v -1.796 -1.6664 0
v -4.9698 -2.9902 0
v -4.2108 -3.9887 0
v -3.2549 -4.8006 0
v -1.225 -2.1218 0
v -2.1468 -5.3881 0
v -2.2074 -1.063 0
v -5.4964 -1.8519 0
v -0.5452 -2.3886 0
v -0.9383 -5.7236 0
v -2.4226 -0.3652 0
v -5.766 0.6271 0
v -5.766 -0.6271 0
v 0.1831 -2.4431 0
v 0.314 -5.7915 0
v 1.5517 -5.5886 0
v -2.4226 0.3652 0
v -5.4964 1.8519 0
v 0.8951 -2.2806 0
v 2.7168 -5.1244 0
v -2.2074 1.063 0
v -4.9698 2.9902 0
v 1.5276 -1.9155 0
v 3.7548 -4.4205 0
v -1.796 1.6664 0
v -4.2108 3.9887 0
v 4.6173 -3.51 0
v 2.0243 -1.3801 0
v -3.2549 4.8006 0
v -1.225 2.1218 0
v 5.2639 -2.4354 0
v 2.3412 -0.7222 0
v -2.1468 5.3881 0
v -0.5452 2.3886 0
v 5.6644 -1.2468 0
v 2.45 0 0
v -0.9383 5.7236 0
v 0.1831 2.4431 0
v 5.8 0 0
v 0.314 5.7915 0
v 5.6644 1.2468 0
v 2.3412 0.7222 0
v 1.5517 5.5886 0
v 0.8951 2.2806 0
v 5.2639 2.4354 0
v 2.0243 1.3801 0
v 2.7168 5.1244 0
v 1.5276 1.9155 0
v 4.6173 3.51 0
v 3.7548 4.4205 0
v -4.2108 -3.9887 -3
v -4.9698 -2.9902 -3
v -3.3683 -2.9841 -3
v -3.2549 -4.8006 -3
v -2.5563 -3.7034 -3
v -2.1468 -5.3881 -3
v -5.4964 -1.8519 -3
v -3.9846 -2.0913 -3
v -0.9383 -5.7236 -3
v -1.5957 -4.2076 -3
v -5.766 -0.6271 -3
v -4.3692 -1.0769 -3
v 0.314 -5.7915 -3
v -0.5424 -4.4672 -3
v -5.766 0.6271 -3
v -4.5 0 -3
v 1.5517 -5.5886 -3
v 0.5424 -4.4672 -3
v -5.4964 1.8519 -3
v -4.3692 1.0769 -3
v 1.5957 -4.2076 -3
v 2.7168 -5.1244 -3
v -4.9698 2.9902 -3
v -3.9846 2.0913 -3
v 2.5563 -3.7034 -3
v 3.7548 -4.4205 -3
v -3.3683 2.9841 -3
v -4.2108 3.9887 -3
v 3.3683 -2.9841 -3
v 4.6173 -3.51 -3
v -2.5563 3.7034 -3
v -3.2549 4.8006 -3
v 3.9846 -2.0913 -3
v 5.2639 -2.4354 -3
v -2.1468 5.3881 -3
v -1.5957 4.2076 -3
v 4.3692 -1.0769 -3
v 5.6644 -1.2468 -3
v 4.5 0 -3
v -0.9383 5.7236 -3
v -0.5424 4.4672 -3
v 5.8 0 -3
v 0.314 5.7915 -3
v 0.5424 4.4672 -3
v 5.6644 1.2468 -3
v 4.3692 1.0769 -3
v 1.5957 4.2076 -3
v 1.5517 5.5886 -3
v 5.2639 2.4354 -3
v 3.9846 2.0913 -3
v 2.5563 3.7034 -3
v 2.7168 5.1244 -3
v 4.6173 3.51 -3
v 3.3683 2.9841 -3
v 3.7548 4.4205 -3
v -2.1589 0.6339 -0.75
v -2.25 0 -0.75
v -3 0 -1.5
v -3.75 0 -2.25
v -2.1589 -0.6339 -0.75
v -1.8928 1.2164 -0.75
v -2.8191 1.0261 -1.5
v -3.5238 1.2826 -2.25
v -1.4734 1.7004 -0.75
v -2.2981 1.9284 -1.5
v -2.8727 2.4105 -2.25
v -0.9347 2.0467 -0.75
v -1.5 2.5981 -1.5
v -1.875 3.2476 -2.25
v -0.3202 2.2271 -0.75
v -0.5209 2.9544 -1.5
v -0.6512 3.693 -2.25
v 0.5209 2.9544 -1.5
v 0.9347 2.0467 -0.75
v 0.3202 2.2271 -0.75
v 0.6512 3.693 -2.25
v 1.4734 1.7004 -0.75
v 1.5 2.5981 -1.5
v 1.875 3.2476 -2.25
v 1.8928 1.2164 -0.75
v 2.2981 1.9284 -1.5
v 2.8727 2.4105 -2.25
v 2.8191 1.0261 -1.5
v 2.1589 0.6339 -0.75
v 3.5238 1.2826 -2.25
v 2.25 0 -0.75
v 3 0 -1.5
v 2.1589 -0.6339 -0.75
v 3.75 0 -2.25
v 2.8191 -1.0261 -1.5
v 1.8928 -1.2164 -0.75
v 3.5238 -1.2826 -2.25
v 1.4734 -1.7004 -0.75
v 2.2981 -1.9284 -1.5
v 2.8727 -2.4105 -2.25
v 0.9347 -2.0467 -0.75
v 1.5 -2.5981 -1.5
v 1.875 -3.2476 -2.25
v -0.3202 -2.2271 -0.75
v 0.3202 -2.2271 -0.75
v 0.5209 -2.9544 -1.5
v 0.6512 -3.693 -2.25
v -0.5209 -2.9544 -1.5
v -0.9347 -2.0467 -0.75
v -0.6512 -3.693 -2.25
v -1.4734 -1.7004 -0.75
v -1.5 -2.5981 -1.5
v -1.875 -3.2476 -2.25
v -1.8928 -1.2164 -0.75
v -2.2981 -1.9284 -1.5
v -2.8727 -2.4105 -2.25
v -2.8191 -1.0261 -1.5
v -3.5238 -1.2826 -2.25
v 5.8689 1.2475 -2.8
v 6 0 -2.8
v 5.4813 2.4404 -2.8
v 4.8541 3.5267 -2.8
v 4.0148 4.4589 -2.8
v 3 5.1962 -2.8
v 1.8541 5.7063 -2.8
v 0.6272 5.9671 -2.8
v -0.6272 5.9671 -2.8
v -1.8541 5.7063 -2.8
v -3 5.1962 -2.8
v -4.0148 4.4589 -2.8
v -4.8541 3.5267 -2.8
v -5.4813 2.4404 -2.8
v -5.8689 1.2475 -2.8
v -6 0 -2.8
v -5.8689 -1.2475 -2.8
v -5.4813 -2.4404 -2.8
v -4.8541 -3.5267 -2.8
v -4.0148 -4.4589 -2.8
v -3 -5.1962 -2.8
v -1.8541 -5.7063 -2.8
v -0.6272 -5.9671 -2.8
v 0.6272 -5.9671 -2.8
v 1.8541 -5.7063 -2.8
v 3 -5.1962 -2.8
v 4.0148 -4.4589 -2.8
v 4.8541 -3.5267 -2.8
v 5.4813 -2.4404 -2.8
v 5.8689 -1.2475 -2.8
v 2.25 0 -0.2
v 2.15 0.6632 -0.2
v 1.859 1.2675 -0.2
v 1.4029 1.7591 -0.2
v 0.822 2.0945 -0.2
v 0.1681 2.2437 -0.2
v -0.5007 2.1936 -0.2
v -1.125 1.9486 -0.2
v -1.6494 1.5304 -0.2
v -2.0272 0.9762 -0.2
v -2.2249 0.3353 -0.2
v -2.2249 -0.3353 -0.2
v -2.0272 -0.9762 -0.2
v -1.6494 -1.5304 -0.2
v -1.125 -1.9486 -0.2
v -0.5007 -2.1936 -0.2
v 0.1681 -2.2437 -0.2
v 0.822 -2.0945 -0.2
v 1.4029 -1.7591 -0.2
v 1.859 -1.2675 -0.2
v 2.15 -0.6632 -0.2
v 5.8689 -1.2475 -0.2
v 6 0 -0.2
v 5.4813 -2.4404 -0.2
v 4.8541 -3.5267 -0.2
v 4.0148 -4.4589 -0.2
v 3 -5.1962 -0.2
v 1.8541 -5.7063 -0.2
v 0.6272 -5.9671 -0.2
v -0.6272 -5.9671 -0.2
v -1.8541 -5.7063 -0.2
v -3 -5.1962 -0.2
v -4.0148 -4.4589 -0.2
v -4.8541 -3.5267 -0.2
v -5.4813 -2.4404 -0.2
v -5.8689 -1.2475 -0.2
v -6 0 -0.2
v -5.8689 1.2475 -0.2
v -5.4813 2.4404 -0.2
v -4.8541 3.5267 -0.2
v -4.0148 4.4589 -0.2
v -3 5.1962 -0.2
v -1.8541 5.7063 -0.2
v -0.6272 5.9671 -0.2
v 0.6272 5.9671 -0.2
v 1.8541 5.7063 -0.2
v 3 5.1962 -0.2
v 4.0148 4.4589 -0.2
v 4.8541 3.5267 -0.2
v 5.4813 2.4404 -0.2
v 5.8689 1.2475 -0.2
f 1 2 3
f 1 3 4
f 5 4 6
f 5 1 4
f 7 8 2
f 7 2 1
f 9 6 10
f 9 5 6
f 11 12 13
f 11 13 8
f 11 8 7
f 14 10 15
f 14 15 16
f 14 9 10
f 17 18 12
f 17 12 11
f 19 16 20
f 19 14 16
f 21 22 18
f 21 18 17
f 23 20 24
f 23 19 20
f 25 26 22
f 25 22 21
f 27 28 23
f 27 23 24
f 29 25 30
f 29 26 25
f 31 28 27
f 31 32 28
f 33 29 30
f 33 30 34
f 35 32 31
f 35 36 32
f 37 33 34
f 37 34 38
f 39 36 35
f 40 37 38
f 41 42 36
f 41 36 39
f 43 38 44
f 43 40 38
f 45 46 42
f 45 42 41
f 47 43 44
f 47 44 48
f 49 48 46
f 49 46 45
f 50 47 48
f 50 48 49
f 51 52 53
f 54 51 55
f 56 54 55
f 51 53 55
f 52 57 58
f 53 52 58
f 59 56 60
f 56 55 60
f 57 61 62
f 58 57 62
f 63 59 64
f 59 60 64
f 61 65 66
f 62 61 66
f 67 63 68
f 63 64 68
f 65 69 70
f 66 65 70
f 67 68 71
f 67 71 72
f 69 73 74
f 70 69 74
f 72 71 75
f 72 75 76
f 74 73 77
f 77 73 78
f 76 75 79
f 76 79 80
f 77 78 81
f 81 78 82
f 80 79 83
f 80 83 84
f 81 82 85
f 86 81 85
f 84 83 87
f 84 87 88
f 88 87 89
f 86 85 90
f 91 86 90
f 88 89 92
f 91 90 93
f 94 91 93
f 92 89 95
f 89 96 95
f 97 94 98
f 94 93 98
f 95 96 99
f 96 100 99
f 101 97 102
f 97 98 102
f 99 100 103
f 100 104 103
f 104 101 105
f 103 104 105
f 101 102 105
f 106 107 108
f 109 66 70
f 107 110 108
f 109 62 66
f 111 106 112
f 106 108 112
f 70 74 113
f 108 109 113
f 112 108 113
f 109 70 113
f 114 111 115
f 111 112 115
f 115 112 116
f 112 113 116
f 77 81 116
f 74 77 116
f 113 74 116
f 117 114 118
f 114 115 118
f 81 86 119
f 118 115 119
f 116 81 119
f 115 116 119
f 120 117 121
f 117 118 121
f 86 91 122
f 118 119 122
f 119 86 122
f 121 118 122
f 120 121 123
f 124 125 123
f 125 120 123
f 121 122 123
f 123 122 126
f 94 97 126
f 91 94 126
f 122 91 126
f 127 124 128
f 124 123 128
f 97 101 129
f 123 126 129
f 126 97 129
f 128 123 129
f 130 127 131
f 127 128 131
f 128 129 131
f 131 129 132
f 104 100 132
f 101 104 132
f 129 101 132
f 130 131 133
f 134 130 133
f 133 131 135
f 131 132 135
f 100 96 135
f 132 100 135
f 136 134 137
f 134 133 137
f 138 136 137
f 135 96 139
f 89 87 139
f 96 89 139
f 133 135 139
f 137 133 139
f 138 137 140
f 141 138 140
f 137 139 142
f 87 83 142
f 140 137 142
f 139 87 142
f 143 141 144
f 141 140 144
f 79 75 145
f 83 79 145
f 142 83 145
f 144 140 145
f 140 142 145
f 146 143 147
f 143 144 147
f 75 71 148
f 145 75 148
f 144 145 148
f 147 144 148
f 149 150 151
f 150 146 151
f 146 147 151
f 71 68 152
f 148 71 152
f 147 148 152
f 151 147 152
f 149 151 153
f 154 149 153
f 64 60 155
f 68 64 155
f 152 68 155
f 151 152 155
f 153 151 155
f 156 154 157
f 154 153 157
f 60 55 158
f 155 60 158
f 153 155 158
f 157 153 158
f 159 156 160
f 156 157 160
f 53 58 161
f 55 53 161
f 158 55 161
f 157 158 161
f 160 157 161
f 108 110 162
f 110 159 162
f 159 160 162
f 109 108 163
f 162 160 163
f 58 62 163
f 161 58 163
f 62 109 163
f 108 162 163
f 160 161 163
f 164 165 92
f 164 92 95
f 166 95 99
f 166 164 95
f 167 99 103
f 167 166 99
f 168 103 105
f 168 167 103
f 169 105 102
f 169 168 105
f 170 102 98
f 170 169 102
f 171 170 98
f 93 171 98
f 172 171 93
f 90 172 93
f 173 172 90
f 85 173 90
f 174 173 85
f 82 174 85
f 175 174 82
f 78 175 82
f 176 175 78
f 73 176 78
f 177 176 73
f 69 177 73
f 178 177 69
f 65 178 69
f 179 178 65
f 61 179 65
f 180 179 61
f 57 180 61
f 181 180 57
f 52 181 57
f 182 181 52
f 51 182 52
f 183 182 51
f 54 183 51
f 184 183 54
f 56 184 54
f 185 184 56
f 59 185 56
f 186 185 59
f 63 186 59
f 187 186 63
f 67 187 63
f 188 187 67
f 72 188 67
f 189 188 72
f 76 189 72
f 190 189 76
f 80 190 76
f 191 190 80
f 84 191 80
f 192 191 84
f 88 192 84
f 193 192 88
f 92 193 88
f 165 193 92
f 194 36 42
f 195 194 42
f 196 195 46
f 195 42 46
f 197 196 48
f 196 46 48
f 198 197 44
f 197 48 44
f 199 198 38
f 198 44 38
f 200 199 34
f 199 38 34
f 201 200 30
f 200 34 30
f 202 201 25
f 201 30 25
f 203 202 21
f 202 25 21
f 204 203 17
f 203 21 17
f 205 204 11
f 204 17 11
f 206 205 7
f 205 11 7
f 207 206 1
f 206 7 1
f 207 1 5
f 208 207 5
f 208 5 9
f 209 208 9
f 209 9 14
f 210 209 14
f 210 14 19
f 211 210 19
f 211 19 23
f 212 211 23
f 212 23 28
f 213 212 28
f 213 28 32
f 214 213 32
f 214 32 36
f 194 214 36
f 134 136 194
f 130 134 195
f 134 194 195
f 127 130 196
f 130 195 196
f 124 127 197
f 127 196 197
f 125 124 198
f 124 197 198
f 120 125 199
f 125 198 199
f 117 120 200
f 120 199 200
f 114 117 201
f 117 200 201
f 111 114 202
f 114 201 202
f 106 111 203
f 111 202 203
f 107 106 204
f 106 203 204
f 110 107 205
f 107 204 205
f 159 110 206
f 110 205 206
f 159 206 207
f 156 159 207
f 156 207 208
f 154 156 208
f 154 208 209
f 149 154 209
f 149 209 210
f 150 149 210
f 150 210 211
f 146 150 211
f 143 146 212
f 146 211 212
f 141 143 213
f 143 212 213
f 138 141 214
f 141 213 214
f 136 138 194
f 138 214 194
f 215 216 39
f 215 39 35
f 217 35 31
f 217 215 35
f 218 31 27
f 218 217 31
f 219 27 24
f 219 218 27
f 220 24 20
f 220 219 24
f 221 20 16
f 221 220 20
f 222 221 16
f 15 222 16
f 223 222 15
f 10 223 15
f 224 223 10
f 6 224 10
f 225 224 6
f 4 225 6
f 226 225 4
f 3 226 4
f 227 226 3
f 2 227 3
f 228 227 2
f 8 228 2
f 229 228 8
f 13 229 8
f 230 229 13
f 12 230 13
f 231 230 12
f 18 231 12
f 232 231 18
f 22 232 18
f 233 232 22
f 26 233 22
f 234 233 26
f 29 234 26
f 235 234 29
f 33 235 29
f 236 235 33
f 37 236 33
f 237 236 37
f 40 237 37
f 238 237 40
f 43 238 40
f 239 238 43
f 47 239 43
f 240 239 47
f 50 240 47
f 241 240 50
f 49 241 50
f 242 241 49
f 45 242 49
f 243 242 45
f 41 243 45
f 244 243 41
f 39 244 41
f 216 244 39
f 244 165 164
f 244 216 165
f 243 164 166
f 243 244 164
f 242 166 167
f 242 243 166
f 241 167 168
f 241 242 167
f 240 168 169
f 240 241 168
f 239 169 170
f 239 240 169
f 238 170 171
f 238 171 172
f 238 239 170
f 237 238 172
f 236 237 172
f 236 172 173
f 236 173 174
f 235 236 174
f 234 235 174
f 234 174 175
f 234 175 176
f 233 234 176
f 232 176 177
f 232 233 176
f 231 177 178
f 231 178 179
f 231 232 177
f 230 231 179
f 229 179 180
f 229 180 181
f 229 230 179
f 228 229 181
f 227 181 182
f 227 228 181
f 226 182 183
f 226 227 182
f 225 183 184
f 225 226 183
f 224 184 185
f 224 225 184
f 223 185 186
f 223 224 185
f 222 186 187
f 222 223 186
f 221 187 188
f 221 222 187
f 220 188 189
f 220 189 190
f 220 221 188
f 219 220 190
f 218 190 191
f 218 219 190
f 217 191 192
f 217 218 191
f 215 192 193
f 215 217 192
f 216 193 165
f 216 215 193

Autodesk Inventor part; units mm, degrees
ref_plane "YZ Plane" through (0, 0, 0) normal (1, 0, 0) x (0, 1, 0)
ref_plane "XZ Plane" through (0, 0, 0) normal (0, 1, 0) x (-1, 0, 0)
ref_plane "XY Plane" through (0, 0, 0) normal (0, 0, 1) x (1, 0, 0)
sketch "Sketch4" plane through (0, 0, 0) normal (0, 0, 1) x (1, 0, 0)
  circle A0 centre (0, 0) radius 6
  circle A1 centre (0, 0) radius 2.25
  dimension "d0" = 4.5
  dimension "d1" = 12
extrude "Extrusion1" add sketch "Sketch4" against normal blind 3
sketch "Sketch6" plane through (0, 0, 0) normal (0, 1, 0) x (-1, 0, 0)
  line L0 (0, -3) -> (4.5, -3)
  line L1 (4.5, -3) -> (0, 1.5)
  line L2 (0, -3) -> (0, 1.5)
  point P0 (0, 0)
  dimension "d12" = 45
  dimension "d13" = 9
  dimension "d15" = 3
revolve "Revolution1" cut sketch "Sketch6" angle 360 about axis through (0, 0, -3) along (0, 0, 1)
chamfer "Chamfer1" distance 0.2 angle 45 3 edges at (-6, 0, -3) (-6, 0, 0) (-2.25, 0, 0)
chamfer "Chamfer2" [suppressed]
equation "\"d0\" = Inside_Diameter"
equation "\"d1\" = Outside_Diameter"
equation "\"d2\" = Thickness"
equation "\"d13\" = 2 * Inside_Diameter"
equation "\"d15\" = Thickness"
equation "\"d4\" = Chamfer"
equation "\"d16\" = Chamfer"
equation "\"Outside_Diameter\" = 12"
equation "\"Inside_Diameter\" = 4.5"
equation "\"Thickness\" = 3"
equation "\"Chamfer\" = 0.2"
properties part number "FWSRS-D12-V4.5-E2.5-T3" material "Stainless Steel"
